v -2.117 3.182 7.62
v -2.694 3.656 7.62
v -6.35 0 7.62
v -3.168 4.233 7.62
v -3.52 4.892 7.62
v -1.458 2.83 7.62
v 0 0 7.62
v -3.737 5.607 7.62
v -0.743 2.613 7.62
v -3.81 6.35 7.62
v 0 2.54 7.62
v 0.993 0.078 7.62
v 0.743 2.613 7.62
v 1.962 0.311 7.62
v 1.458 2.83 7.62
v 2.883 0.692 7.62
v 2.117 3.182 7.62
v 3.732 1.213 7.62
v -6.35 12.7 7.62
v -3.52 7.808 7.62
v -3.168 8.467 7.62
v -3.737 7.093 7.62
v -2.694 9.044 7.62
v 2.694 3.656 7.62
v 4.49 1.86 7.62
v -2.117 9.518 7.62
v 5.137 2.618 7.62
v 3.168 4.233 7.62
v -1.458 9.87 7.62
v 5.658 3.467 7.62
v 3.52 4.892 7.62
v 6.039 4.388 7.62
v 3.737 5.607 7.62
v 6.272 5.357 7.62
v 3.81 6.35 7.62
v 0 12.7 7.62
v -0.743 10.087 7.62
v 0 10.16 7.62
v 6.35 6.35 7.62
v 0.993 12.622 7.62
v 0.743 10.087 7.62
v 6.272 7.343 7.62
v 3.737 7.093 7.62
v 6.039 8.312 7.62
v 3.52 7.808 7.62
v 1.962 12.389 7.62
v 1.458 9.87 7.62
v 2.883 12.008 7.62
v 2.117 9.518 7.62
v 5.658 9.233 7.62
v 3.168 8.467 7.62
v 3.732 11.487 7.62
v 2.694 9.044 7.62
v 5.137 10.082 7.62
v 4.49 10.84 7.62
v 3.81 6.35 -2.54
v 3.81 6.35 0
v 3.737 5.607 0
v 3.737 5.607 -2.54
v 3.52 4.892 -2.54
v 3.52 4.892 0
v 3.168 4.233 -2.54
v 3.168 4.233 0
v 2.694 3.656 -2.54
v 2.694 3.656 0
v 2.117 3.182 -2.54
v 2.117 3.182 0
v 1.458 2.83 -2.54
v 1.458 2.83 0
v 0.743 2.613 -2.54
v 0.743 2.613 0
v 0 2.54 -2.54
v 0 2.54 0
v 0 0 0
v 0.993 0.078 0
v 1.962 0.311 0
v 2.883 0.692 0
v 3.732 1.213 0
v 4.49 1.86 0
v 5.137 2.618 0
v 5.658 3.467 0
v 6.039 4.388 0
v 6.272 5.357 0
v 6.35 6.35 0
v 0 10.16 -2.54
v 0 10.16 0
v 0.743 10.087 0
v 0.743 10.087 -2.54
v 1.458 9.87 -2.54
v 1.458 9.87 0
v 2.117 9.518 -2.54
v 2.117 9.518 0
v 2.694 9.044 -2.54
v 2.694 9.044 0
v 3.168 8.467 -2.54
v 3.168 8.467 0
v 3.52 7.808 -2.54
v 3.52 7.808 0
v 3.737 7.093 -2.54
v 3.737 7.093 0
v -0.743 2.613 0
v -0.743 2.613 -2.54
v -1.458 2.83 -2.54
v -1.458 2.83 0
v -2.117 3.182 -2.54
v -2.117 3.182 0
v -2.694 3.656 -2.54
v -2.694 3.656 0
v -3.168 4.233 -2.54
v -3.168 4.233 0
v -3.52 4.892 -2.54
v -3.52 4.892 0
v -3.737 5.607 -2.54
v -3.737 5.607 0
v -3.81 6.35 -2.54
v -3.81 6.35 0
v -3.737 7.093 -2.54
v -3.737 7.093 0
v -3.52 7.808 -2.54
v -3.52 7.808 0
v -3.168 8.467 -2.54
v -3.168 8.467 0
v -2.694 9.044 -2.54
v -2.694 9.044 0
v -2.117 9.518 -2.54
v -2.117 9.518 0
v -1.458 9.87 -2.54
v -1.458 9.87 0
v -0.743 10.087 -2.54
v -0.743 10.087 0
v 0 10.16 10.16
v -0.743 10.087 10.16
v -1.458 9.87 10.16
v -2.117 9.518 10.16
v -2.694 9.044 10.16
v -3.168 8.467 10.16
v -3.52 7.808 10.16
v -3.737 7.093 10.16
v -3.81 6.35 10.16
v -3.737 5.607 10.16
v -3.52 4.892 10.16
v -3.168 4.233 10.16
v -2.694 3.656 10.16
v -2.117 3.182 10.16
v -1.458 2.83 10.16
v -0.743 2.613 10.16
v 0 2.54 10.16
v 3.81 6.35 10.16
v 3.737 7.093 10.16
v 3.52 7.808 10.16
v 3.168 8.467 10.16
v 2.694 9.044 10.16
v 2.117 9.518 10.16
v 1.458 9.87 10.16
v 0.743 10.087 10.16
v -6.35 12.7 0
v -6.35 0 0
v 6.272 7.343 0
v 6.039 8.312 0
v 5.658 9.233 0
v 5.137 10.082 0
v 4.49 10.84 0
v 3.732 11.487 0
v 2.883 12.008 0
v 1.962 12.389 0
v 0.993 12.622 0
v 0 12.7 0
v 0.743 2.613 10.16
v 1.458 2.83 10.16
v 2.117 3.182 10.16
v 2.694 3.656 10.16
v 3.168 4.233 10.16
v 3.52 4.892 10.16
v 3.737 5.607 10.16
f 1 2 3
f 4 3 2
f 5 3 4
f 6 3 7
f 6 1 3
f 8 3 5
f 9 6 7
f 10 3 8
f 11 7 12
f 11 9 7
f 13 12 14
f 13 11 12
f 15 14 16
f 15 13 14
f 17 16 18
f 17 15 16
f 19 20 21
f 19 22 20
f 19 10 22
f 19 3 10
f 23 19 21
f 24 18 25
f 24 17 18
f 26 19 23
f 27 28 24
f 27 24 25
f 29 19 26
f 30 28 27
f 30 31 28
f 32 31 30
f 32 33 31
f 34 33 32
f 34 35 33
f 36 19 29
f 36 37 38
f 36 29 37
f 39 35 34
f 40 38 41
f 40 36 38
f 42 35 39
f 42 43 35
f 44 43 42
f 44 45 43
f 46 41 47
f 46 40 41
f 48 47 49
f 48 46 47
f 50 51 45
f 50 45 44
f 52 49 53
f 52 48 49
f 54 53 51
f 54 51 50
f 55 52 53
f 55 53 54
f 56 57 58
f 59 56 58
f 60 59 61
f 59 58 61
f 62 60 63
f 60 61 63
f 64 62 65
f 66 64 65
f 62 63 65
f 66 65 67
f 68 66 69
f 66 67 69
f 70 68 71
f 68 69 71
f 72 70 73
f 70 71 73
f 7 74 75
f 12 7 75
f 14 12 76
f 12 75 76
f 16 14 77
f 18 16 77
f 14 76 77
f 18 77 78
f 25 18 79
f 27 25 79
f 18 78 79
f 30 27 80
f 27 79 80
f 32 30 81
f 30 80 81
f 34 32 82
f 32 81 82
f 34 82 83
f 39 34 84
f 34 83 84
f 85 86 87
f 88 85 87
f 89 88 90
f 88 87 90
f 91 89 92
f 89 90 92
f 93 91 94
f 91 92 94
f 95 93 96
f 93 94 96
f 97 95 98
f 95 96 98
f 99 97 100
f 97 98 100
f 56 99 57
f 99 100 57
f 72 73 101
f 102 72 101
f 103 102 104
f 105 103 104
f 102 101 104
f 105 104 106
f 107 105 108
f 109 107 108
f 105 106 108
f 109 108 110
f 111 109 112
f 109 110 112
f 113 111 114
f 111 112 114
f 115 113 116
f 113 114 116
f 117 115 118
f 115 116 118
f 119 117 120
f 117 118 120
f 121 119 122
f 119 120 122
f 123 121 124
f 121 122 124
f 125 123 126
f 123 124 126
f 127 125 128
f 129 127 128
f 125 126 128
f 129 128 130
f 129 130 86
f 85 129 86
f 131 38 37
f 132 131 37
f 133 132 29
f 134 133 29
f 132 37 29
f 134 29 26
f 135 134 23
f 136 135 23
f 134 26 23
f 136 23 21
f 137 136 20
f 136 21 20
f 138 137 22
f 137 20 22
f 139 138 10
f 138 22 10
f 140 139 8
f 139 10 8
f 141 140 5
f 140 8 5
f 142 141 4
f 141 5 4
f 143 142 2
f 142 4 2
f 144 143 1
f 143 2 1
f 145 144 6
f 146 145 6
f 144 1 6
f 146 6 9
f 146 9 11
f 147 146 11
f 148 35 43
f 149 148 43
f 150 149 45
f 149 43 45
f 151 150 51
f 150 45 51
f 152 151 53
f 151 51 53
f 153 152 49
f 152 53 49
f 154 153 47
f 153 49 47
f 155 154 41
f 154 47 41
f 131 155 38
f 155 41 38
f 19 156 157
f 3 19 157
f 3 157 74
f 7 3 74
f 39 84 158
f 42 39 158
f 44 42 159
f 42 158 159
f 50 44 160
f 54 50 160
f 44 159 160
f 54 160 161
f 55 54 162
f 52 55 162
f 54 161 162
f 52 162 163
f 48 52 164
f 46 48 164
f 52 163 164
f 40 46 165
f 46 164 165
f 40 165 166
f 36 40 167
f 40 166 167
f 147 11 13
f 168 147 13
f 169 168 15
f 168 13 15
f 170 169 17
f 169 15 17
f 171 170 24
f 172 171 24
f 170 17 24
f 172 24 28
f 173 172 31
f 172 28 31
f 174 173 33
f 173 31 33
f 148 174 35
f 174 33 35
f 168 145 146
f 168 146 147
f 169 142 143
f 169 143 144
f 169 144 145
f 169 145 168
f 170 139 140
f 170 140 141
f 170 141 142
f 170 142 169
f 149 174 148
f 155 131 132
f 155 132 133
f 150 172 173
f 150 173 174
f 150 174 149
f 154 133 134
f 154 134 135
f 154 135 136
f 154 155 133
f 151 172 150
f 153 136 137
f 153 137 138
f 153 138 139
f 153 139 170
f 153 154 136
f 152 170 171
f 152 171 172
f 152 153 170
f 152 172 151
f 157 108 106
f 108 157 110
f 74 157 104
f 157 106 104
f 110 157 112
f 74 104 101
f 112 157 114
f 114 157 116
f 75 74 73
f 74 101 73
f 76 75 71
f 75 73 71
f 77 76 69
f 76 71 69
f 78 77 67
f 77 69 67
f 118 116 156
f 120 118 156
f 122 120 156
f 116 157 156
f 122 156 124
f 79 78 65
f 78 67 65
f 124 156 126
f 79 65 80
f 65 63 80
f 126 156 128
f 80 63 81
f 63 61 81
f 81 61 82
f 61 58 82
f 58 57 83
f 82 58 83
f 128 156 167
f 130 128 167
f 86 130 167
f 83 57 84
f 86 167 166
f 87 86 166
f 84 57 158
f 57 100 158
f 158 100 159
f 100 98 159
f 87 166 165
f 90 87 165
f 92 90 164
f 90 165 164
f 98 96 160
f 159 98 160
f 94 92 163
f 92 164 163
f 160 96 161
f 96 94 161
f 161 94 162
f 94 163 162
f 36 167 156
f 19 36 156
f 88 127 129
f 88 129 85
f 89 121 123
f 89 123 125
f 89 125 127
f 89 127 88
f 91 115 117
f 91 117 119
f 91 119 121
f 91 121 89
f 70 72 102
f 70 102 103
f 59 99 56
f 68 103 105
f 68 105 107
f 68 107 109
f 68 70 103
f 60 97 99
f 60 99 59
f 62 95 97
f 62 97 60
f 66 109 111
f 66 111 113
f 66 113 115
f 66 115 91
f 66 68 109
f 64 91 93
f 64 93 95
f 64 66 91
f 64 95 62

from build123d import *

# Parameters (mm, degrees)
F1_DEPTH = 7.62
F3_DEPTH = 2.54
F5_DEPTH = 2.54


with BuildPart() as f1:
    # F0 (on Top) → F1 (new body)
    with BuildSketch(Plane.XY):
        with BuildLine():
            ThreePointArc((-6.35, 6.35), (-4.4901280605, 1.8598719395), (0, 0))
            Line((0, 0), (0, 12.7))
            ThreePointArc((0, 12.7), (-4.4901280605, 10.8401280605), (-6.35, 6.35))
        make_face()
        with BuildLine():
            Line((0, 12.7), (0, 0))
            ThreePointArc((0, 0), (4.4901280605, 1.8598719395), (6.35, 6.35))
            ThreePointArc((6.35, 6.35), (4.4901280605, 10.8401280605), (0, 12.7))
        make_face()
        with BuildLine():
            Line((-6.35, 0), (0, 0))
            ThreePointArc((0, 0), (-4.4901280605, 1.8598719395), (-6.35, 6.35))
            Line((-6.35, 6.35), (-6.35, 0))
        make_face()
        with BuildLine():
            ThreePointArc((-6.35, 6.35), (-4.4901280605, 10.8401280605), (0, 12.7))
            Line((0, 12.7), (-6.35, 12.7))
            Line((-6.35, 12.7), (-6.35, 6.35))
        make_face()
    extrude(amount=F1_DEPTH)

    # F2 (on face) → F3 (join)
    with BuildSketch(Plane.XY.offset(7.62)):
        with BuildLine():
            ThreePointArc((0, 10.16), (-3.81, 6.35), (0, 2.54))
            Line((0, 2.54), (0, 10.16))
        make_face()
        with BuildLine():
            Line((0, 10.16), (0, 2.54))
            ThreePointArc((0, 2.54), (2.6940768363, 3.6559231637), (3.81, 6.35))
            ThreePointArc((3.81, 6.35), (2.6940768363, 9.0440768363), (0, 10.16))
        make_face()
    extrude(amount=F3_DEPTH)

    # F4 (on face) → F5 (join)
    with BuildSketch(Plane(origin=(0, 0, 0), x_dir=(1, 0, 0), z_dir=(0, 0, -1))):
        with BuildLine():
            ThreePointArc((0, -2.54), (-3.81, -6.35), (0, -10.16))
            Line((0, -10.16), (0, -2.54))
        make_face()
        with BuildLine():
            Line((0, -2.54), (0, -10.16))
            ThreePointArc((0, -10.16), (2.6940768363, -9.0440768363), (3.81, -6.35))
            ThreePointArc((3.81, -6.35), (2.6940768363, -3.6559231637), (0, -2.54))
        make_face()
    extrude(amount=F5_DEPTH)


solid = f1.part
